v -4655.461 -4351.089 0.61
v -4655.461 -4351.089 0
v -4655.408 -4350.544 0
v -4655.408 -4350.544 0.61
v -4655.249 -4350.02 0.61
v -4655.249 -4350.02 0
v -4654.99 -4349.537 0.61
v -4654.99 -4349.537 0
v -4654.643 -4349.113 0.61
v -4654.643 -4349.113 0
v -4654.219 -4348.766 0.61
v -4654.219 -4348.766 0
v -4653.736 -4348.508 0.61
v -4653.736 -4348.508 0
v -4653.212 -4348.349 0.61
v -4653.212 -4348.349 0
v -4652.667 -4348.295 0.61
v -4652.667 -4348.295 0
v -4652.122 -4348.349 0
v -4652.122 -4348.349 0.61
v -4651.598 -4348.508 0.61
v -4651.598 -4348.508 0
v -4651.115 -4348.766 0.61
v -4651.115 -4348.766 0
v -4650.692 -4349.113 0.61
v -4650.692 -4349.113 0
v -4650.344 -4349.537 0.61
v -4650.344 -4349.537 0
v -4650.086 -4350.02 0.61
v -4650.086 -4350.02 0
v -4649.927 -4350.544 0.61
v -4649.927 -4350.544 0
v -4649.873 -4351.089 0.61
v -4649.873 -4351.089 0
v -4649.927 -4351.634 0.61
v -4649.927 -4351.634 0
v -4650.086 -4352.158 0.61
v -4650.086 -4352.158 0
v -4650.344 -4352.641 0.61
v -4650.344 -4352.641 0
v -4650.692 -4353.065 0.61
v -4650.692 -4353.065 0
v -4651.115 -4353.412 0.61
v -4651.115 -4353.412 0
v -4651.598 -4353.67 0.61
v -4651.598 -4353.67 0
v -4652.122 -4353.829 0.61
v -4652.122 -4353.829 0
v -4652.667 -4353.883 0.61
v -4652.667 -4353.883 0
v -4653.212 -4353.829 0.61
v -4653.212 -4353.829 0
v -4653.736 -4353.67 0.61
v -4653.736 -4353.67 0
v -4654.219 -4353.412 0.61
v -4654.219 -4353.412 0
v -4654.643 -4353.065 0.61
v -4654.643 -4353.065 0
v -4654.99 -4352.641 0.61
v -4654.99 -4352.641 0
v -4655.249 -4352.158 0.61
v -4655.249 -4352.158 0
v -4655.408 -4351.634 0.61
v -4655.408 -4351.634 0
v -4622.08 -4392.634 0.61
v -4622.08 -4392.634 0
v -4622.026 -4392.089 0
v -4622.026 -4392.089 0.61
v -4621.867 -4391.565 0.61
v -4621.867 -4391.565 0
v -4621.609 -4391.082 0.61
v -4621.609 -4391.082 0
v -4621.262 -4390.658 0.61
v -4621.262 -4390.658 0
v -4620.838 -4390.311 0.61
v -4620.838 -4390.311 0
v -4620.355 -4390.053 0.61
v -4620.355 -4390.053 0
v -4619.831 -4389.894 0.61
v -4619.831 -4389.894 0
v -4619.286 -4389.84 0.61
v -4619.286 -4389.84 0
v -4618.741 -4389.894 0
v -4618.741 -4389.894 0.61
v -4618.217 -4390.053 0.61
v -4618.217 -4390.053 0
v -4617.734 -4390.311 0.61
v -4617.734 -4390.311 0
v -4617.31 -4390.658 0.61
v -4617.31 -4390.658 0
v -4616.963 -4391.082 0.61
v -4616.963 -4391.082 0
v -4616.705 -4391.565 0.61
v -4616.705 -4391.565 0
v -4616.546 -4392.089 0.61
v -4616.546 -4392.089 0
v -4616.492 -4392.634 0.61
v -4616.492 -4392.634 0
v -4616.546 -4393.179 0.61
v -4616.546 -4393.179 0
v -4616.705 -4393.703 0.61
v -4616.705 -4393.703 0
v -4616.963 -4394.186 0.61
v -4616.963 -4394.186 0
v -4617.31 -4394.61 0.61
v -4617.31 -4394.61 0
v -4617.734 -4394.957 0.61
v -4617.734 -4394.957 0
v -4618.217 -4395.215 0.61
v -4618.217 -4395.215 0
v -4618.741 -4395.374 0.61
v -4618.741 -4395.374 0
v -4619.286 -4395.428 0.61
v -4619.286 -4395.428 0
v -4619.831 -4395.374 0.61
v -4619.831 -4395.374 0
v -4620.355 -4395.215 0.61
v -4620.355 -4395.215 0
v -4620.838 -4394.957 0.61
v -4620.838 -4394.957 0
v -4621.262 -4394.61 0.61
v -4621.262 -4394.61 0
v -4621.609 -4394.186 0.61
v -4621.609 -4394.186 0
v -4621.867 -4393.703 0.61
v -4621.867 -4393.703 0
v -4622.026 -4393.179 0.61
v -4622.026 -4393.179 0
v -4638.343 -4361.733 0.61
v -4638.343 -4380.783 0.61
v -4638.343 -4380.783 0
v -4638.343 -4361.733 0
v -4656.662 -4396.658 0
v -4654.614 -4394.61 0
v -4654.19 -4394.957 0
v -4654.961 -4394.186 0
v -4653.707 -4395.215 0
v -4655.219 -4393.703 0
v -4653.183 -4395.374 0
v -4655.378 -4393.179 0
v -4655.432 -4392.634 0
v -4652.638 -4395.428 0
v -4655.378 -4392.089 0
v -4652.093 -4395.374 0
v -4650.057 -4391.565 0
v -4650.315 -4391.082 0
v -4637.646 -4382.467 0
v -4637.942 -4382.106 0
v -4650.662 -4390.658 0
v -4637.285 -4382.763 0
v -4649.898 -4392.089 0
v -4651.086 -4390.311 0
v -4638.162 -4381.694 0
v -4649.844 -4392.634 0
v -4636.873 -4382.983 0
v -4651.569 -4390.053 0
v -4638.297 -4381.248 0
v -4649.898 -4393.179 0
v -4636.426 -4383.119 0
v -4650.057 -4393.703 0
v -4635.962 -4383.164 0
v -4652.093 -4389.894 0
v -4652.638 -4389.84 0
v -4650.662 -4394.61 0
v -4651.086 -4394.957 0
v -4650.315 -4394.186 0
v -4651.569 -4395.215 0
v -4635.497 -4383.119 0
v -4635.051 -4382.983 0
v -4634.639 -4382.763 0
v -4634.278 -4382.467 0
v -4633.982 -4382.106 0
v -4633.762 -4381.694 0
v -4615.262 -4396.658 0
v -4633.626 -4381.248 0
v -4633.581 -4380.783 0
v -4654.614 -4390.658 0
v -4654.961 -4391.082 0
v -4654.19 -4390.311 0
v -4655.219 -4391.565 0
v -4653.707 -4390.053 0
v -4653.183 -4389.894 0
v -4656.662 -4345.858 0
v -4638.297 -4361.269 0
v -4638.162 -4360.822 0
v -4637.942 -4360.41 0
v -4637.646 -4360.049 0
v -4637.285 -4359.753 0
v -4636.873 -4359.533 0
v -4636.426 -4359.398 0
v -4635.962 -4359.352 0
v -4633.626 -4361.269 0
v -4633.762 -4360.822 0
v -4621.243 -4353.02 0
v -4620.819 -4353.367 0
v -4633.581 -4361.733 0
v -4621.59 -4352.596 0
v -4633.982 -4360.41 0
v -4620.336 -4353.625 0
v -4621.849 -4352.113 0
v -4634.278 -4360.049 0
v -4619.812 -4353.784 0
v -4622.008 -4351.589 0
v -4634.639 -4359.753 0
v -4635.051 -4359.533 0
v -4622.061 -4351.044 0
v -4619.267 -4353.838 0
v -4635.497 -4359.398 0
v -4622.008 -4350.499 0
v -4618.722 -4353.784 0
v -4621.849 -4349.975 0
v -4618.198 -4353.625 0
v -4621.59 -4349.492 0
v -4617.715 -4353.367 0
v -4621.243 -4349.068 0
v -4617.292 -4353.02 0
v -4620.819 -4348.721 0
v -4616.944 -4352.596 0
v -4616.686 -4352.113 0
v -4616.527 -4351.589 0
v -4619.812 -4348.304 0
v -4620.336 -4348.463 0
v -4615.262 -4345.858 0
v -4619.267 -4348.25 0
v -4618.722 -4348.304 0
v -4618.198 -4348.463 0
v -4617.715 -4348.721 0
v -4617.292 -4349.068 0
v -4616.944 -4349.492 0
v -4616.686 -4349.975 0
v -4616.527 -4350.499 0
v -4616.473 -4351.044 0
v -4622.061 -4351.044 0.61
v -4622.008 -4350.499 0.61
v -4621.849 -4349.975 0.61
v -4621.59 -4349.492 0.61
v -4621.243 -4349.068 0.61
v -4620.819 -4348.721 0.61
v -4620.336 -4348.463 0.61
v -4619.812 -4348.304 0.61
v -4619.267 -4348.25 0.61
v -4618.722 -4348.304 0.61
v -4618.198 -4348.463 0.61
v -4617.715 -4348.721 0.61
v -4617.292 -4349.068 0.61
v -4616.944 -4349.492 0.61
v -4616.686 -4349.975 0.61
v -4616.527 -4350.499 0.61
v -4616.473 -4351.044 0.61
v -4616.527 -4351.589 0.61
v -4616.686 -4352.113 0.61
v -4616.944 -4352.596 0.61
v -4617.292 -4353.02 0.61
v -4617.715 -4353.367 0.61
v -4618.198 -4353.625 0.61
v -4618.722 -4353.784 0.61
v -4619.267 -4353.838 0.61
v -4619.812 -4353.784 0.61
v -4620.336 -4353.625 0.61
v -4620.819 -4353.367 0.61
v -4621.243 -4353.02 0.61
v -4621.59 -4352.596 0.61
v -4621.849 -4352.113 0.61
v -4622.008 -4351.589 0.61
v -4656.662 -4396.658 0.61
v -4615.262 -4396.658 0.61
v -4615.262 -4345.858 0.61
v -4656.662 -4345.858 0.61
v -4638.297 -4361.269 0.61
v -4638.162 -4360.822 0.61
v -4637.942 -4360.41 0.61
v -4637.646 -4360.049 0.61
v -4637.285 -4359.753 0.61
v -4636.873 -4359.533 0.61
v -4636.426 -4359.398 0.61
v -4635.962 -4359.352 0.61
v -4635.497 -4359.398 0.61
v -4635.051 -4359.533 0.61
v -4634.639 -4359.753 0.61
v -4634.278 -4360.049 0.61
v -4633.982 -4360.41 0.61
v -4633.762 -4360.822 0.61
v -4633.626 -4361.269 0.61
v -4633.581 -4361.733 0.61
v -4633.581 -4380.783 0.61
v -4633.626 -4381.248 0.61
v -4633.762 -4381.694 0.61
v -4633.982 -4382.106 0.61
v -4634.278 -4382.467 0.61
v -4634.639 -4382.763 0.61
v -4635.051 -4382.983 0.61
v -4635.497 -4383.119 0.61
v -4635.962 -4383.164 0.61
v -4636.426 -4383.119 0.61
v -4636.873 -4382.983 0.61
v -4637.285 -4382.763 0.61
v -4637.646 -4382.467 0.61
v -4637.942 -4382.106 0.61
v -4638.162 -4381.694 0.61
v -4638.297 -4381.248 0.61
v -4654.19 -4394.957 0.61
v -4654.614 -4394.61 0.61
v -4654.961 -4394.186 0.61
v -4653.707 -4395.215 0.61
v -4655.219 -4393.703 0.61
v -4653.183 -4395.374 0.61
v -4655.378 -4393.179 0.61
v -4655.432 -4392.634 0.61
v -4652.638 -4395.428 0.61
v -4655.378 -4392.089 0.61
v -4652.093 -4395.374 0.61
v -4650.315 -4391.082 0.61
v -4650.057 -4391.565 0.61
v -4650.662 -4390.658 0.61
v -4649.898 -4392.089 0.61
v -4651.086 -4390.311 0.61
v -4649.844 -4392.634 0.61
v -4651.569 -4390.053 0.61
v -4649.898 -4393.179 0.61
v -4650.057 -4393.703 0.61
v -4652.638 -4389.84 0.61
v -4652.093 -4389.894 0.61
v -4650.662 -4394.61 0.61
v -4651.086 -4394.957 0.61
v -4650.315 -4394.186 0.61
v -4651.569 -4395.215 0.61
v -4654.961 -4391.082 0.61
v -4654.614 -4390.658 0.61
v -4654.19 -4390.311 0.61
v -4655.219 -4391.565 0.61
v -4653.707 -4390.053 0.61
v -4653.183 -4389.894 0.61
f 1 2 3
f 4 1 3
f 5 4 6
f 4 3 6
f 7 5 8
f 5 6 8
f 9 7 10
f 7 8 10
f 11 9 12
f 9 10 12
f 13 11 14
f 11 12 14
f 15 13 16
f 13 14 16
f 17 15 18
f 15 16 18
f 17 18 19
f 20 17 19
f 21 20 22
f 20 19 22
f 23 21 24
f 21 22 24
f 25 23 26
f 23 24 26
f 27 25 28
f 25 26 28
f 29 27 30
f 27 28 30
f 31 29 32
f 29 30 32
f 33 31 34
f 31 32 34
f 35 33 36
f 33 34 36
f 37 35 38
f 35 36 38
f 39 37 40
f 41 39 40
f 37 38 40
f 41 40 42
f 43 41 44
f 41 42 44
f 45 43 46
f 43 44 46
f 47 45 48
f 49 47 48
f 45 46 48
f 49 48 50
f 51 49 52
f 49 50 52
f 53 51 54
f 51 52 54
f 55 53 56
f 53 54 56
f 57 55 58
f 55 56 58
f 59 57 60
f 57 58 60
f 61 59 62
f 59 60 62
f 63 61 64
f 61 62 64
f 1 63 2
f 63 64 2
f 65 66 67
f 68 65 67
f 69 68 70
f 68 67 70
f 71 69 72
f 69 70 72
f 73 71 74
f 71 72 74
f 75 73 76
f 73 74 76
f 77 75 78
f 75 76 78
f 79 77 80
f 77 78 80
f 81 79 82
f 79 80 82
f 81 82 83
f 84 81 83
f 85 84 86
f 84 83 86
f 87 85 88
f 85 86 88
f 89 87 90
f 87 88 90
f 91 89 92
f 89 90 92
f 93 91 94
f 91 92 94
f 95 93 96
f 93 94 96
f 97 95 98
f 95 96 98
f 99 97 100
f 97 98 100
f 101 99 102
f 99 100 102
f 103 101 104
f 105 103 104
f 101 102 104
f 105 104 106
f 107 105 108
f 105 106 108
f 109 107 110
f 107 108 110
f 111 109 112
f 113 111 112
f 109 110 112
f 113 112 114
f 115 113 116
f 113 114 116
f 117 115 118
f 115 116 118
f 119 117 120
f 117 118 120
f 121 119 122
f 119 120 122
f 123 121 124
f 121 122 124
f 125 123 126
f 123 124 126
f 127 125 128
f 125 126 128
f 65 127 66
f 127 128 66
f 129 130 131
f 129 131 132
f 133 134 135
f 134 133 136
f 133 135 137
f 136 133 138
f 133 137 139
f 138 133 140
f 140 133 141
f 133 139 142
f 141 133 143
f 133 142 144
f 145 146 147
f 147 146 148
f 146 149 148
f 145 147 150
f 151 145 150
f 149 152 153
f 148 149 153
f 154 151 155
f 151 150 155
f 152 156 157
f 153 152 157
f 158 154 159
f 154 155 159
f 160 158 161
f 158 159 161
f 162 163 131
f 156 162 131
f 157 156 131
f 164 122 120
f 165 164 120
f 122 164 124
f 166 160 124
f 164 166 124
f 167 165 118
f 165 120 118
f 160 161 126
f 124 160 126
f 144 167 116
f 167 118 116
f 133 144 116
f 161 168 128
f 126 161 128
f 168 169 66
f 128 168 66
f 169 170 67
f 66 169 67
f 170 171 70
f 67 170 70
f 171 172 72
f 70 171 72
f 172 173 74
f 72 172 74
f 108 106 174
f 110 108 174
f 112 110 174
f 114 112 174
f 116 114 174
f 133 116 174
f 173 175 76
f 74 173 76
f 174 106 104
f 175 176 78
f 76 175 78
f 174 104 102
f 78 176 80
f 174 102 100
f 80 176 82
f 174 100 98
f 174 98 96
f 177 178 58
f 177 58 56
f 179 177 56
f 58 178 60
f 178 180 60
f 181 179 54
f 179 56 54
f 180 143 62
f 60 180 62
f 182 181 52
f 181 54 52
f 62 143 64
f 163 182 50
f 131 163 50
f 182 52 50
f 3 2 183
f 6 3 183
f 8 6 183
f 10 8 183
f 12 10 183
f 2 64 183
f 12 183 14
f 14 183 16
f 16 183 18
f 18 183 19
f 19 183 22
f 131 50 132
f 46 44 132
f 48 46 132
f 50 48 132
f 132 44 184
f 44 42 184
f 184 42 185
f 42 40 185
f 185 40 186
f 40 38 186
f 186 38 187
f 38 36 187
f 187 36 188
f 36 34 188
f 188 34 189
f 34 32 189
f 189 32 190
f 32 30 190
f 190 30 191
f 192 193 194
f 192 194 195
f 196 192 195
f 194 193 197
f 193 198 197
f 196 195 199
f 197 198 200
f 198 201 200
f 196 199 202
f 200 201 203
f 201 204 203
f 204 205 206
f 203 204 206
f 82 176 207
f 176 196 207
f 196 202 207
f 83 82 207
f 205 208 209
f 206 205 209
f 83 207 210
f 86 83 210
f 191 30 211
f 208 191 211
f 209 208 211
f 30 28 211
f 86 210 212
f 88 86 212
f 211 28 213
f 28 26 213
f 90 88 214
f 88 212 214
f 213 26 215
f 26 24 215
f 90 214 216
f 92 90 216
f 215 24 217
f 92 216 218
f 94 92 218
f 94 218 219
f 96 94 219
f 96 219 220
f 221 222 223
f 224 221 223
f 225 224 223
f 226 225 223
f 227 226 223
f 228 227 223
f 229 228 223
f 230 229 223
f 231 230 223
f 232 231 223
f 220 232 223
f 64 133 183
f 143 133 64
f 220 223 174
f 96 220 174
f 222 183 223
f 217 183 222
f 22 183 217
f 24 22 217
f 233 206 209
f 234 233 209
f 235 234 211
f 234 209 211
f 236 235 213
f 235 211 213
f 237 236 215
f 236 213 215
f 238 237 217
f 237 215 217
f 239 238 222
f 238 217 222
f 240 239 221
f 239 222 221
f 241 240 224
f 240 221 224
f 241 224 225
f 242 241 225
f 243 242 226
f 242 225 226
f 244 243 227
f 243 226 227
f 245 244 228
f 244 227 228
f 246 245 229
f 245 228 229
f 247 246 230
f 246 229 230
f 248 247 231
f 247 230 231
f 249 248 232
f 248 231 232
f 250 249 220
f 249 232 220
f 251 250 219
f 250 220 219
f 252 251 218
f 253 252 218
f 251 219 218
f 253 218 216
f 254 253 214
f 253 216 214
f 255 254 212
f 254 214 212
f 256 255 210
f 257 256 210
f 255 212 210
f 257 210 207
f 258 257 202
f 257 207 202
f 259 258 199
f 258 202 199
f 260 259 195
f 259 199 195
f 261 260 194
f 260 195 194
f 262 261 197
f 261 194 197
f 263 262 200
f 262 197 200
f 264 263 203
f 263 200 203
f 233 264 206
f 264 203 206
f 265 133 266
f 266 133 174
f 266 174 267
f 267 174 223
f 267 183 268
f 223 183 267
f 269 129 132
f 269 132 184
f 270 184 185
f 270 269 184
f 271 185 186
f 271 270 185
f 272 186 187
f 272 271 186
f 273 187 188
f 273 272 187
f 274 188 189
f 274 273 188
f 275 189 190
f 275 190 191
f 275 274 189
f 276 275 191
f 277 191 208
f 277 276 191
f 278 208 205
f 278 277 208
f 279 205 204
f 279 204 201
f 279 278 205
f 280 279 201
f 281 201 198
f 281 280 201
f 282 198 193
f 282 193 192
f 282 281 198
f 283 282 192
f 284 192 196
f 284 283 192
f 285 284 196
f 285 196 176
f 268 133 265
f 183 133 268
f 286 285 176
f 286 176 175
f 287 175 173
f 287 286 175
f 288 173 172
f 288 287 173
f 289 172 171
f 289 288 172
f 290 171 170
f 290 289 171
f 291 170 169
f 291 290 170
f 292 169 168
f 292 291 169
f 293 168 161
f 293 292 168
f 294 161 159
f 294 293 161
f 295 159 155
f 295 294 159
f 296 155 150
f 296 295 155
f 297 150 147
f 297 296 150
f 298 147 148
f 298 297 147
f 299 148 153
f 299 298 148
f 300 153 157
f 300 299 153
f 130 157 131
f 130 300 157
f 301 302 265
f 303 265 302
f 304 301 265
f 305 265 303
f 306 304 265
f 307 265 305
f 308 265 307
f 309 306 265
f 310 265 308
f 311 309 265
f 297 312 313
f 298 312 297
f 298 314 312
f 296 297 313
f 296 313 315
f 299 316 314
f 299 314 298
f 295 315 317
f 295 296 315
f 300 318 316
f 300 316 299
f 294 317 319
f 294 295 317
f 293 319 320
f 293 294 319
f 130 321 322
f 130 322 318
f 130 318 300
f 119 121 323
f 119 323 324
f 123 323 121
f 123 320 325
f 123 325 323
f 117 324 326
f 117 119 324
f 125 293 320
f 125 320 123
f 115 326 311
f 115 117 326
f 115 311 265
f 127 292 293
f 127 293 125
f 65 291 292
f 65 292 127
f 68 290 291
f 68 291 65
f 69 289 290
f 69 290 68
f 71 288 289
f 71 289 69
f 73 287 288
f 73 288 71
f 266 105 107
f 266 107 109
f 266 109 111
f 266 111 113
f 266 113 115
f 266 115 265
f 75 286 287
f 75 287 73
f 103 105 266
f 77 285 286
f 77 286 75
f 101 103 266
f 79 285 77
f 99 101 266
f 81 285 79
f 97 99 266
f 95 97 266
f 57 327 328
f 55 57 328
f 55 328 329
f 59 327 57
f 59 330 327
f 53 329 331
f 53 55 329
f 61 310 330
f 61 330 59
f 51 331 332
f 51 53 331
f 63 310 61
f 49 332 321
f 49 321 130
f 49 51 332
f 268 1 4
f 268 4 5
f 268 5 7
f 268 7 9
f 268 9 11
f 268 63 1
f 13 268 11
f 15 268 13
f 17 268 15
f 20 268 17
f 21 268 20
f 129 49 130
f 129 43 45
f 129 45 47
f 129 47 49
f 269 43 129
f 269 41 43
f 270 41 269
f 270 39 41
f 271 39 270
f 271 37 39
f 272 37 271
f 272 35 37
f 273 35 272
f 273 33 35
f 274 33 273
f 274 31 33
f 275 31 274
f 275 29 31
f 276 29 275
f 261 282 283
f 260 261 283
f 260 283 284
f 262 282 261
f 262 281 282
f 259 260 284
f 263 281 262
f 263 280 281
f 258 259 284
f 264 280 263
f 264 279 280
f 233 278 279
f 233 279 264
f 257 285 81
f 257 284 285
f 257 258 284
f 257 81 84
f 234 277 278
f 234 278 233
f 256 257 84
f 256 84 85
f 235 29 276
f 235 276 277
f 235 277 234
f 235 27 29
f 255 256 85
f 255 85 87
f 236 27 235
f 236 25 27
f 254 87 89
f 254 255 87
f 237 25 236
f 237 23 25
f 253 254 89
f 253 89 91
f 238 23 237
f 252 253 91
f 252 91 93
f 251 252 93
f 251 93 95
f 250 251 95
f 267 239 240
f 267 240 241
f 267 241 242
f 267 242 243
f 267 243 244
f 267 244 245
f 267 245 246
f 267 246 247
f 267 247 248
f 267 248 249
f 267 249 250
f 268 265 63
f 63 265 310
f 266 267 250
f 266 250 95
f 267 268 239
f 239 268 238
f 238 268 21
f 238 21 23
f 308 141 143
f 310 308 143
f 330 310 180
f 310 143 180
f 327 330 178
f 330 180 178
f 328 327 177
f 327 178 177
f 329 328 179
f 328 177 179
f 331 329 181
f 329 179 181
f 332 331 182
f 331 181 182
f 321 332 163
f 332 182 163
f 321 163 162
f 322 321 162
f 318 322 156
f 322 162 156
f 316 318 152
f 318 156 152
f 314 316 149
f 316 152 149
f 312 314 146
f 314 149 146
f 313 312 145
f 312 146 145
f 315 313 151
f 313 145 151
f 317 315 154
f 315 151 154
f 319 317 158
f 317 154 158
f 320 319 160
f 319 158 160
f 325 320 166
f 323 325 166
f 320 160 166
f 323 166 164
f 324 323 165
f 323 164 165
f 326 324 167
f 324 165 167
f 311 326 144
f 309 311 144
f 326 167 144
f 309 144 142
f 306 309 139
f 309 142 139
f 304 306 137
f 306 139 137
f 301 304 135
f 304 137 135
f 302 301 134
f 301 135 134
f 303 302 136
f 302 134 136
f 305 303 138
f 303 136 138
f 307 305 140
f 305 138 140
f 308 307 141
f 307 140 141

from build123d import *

# Parameters (mm, degrees)
SKETCH1_W           = 41.4
SKETCH1_H           = 50.8
BOSS_EXTRUDE1_DEPTH = 0.6096
CUT_EXTRUDE2_DEPTH  = 0.6096
SKETCH9_R           = 2.794
CUT_EXTRUDE3_DEPTH  = 0.6096


with BuildPart() as part:
    # Sketch1 → Boss-Extrude1 (new body)
    with BuildSketch(Plane.XY):
        with Locations((-4635.961935484, -4371.258064516)):
            Rectangle(SKETCH1_W, SKETCH1_H)
    extrude(amount=BOSS_EXTRUDE1_DEPTH)

    # Sketch4 → Cut-Extrude2 (cut)
    with BuildSketch(Plane.XY.offset(0.6096)):
        with BuildLine():
            Line((-4638.343185484, -4380.783064516), (-4638.343185484, -4361.733064516))
            ThreePointArc((-4638.343185484, -4361.733064516), (-4635.961935484, -4359.351814516), (-4633.580685484, -4361.733064516))
            Line((-4633.580685484, -4361.733064516), (-4633.580685484, -4380.783064516))
            ThreePointArc((-4633.580685484, -4380.783064516), (-4635.961935484, -4383.164314516), (-4638.343185484, -4380.783064516))
        make_face()
    extrude(amount=-CUT_EXTRUDE2_DEPTH, mode=Mode.SUBTRACT)

    # Sketch9 → Cut-Extrude3 (cut)
    with BuildSketch(Plane(origin=(0, 0, 0), x_dir=(-1, 0, 0), z_dir=(0, 0, -1))):
        with Locations((4619.267234292, -4351.044101977)):
            Circle(SKETCH9_R)
        with Locations((4652.667204287, -4351.088871634)):
            Circle(SKETCH9_R)
        with Locations((4619.28588452, -4392.63411548)):
            Circle(SKETCH9_R)
        with Locations((4652.637986448, -4392.63411548)):
            Circle(SKETCH9_R)
    extrude(amount=-CUT_EXTRUDE3_DEPTH, mode=Mode.SUBTRACT)


solid = part.part
